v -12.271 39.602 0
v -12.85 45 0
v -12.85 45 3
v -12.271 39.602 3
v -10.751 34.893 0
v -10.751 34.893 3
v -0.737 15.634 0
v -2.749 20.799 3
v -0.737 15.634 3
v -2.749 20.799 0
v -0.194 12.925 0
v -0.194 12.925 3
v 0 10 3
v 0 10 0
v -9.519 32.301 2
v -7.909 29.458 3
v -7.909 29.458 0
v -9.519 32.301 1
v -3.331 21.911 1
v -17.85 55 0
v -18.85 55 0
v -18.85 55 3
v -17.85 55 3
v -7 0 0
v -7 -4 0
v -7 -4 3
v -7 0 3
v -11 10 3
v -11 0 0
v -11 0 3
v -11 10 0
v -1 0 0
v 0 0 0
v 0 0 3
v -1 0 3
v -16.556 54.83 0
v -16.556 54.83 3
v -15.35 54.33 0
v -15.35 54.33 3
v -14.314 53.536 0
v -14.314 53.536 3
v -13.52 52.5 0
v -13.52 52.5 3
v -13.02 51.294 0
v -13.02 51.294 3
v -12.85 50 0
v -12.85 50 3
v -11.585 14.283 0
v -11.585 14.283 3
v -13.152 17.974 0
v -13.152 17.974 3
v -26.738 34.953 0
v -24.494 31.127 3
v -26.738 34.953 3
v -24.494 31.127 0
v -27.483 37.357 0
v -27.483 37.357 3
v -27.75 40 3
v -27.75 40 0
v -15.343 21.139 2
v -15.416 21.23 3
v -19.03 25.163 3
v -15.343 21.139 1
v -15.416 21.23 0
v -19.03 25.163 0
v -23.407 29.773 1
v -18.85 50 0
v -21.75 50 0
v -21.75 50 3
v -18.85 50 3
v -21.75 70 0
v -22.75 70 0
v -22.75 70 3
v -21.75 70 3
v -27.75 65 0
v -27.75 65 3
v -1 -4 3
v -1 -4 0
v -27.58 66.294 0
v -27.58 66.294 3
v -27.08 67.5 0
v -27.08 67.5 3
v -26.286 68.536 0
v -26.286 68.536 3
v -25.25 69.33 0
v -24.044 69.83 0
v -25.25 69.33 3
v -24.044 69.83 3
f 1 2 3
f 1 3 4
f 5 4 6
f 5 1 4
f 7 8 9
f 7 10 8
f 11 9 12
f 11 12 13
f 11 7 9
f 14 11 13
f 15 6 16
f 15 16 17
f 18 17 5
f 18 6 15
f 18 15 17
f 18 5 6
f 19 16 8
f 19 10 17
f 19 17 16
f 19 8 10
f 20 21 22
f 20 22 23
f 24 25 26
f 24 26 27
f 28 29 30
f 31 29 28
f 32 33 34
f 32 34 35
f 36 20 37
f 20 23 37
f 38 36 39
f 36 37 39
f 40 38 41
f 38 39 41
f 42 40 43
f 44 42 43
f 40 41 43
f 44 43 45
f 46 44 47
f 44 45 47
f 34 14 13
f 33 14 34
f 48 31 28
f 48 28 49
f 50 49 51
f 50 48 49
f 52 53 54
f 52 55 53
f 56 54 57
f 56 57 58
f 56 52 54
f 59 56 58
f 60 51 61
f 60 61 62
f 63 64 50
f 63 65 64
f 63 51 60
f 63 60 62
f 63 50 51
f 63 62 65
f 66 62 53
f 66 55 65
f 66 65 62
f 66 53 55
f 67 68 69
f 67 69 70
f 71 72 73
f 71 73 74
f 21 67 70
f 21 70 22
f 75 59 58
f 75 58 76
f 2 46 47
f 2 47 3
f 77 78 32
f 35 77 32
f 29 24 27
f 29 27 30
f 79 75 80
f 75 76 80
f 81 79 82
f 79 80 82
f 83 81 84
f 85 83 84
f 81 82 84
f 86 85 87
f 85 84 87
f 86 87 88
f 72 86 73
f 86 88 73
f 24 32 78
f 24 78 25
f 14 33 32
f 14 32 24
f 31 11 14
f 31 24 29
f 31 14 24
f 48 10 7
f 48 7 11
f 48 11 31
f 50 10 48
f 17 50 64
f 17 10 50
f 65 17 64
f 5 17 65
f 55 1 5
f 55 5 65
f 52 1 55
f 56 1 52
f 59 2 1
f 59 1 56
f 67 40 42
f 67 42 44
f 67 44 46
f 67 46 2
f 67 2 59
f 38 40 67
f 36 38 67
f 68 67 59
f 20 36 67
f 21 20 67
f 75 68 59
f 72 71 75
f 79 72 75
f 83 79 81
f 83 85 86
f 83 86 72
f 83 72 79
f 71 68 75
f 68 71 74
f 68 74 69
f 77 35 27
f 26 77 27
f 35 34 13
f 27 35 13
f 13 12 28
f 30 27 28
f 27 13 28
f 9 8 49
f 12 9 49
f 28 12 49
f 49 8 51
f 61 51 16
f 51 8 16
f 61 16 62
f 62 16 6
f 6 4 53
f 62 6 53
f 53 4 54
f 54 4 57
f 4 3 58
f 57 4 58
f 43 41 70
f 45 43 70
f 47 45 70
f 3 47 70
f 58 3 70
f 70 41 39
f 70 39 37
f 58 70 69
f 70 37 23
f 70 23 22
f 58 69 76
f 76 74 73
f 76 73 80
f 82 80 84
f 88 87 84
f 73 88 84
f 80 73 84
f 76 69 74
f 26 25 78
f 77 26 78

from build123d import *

# Parameters (mm, degrees)
SKETCH1_W           = 6
SKETCH1_H           = 4
BOSS_EXTRUDE1_DEPTH = 3
FILLET1_R           = 5


with BuildPart() as part:
    # Sketch1 → Boss-Extrude1 (new body)
    with BuildSketch(Plane.XY):
        with BuildLine():
            Line((0, 0), (-11, 0))
            Line((-11, 0), (-11, 10))
            add(Edge.make_bspline(
                [(-11, 10), (-11, 23.756315473), (-27.75, 27.611609377), (-27.75, 40)],
                knots=[0, 0, 0, 0, 1, 1, 1, 1], degree=3))
            Line((-27.75, 40), (-27.75, 70))
            Line((-27.75, 70), (-21.75, 70))
            Line((-21.75, 70), (-21.75, 50))
            Line((-21.75, 50), (-18.85, 50))
            Line((-18.85, 50), (-18.85, 55))
            Line((-18.85, 55), (-12.85, 55))
            Line((-12.85, 55), (-12.85, 45))
            add(Edge.make_bspline(
                [(-12.85, 45), (-12.85, 29.868343374), (0, 23.949472312), (0, 10)],
                knots=[0, 0, 0, 0, 1, 1, 1, 1], degree=3))
            Line((0, 10), (0, 0))
        make_face()
        with Locations((-4, -2)):
            Rectangle(SKETCH1_W, SKETCH1_H)
    extrude(amount=BOSS_EXTRUDE1_DEPTH)

    # Fillet1
    fillet1_edges = [part.edges().sort_by_distance(p)[0] for p in [
        (-27.75, 70, 1.5),
        (-12.85, 55, 1.5),
    ]]
    fillet(fillet1_edges, radius=FILLET1_R)


solid = part.part
